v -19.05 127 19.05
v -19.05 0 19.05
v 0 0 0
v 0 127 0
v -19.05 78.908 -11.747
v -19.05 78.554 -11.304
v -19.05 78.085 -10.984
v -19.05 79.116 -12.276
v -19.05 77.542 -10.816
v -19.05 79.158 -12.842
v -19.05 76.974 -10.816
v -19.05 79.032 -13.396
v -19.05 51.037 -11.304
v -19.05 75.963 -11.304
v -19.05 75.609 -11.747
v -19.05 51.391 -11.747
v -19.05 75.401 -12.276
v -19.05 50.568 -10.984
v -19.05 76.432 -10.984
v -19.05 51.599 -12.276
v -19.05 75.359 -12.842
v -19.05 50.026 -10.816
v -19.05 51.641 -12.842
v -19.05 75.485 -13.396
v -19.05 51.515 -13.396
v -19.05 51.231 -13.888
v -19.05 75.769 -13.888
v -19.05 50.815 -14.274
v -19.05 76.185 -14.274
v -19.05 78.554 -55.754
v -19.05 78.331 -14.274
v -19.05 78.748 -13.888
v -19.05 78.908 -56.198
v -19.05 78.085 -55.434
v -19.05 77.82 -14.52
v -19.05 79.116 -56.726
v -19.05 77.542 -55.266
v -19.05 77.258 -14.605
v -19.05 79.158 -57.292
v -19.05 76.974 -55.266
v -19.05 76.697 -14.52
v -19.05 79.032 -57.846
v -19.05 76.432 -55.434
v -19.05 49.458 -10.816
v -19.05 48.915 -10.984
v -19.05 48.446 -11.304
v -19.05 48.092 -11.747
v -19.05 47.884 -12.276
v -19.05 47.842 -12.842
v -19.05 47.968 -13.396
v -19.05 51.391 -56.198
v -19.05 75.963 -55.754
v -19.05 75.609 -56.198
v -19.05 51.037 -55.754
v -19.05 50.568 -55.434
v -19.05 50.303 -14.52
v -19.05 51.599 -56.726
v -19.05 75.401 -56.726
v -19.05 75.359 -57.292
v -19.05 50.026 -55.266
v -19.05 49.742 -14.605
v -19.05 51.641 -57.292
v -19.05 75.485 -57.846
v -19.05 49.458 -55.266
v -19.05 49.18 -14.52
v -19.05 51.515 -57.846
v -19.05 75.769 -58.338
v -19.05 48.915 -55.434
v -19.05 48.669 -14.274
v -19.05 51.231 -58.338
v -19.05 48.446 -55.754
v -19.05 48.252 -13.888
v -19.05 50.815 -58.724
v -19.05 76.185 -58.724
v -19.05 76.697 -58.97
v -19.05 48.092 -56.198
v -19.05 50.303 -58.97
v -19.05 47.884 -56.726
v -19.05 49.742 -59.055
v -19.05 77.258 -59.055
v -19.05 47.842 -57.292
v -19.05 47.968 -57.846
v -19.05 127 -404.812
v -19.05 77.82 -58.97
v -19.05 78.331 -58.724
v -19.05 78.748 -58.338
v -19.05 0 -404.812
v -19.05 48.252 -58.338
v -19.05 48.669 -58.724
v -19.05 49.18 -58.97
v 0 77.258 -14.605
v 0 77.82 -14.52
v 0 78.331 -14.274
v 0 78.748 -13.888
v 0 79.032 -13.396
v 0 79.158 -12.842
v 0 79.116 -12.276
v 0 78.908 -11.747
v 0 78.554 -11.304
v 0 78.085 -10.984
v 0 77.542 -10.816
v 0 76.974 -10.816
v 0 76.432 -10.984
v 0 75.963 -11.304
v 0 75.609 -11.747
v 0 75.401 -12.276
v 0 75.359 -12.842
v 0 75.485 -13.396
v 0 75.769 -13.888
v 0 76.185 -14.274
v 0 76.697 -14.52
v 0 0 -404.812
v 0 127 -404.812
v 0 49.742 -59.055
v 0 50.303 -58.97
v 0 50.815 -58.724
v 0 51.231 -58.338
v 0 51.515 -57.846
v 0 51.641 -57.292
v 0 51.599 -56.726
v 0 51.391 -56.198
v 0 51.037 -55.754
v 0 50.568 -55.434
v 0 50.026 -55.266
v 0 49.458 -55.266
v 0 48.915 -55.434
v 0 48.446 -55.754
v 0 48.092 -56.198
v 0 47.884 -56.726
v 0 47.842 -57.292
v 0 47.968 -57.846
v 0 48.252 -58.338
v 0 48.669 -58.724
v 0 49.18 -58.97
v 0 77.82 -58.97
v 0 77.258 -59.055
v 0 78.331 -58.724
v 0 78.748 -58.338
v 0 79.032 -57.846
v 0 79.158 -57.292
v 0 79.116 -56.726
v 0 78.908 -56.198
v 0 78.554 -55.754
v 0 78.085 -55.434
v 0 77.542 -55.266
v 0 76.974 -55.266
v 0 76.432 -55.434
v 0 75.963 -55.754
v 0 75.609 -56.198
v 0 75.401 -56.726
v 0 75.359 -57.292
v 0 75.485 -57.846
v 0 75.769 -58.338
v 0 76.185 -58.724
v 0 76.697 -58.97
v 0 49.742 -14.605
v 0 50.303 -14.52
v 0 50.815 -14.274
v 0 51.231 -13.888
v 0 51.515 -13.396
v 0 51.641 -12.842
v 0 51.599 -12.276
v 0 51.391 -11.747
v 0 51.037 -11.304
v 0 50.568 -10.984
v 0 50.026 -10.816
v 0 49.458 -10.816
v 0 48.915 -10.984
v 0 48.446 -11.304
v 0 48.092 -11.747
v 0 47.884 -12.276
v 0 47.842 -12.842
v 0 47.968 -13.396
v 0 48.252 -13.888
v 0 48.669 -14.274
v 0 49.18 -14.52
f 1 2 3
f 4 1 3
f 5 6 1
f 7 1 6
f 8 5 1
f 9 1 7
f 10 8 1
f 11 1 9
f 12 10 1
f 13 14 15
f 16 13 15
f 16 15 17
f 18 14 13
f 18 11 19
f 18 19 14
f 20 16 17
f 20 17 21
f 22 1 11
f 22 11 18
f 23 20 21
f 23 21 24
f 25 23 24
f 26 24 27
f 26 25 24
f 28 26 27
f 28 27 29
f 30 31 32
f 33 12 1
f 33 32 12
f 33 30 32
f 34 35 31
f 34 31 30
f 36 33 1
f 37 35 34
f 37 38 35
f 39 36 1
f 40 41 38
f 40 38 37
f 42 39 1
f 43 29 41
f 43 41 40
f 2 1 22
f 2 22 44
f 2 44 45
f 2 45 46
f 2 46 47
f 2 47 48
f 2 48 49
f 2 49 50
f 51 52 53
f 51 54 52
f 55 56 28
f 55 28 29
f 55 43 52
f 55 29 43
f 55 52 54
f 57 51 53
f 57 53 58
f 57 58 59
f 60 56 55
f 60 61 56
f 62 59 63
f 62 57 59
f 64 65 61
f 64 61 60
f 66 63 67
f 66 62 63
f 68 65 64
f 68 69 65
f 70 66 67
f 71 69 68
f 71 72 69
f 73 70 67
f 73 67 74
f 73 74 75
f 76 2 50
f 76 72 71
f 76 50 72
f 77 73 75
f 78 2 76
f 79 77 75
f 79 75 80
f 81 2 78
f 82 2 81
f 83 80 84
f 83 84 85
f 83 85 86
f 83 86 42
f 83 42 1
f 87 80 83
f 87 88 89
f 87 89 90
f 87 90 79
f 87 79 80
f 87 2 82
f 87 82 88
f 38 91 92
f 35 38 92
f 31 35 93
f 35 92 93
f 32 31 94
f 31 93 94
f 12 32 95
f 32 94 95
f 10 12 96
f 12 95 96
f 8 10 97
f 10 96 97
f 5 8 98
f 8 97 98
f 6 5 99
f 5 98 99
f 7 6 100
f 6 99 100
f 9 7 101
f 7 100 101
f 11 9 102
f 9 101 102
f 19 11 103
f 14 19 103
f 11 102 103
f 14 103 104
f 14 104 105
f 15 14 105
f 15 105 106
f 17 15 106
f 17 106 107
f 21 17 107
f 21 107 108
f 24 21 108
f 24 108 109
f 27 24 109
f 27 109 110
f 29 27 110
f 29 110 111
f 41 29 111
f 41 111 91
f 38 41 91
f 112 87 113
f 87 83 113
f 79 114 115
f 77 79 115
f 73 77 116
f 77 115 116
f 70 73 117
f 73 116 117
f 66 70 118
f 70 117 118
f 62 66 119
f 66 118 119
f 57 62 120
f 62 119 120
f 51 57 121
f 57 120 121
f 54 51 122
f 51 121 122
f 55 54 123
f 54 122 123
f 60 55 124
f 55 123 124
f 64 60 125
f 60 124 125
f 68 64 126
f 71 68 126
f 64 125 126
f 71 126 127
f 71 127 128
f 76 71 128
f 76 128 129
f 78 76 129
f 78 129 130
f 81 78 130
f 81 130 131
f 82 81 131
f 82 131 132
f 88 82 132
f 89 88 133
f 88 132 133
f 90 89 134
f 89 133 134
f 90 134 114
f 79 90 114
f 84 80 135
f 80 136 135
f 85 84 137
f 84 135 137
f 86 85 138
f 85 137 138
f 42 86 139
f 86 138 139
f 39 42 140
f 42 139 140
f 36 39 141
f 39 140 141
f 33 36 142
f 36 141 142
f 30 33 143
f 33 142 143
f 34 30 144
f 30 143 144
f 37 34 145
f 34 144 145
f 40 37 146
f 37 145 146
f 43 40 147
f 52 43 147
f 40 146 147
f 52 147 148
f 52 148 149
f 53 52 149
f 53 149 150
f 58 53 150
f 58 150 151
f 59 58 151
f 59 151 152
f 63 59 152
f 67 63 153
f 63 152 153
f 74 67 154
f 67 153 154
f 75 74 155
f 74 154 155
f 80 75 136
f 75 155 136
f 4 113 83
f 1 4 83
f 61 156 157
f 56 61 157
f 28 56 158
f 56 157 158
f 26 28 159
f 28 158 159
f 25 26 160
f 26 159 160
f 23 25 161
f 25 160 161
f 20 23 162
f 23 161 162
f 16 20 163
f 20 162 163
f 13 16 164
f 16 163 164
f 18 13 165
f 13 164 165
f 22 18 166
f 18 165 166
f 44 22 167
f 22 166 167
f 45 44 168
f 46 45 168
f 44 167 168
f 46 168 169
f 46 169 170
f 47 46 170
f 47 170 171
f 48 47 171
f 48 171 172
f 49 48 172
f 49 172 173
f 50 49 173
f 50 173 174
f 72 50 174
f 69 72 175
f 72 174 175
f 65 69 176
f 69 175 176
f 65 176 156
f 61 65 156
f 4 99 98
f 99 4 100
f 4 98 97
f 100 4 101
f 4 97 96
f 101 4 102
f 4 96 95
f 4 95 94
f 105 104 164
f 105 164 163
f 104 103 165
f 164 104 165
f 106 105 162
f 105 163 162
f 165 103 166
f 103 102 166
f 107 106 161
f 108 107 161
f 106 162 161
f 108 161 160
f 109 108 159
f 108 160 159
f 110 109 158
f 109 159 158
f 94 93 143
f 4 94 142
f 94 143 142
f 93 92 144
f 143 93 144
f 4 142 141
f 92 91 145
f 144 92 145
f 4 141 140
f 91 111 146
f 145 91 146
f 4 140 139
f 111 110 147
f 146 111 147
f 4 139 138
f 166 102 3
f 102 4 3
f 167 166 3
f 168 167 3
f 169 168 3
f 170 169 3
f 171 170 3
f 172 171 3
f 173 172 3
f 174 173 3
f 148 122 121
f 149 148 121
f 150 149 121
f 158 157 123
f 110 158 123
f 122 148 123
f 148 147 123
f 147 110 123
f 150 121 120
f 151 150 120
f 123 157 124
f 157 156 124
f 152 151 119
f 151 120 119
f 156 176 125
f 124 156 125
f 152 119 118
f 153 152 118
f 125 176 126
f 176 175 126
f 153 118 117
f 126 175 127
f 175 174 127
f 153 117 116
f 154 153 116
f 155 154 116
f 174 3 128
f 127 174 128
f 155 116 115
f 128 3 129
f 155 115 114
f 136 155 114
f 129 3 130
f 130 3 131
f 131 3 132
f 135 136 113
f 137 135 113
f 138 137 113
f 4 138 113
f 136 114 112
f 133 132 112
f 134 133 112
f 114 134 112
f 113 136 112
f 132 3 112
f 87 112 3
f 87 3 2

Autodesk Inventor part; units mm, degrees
ref_plane "YZ Plane" through (0, 0, 0) normal (1, 0, 0) x (0, 1, 0)
ref_plane "XZ Plane" through (0, 0, 0) normal (0, 1, 0) x (-1, 0, 0)
ref_plane "XY Plane" through (0, 0, 0) normal (0, 0, 1) x (1, 0, 0)
sketch "Sketch2" plane through (0, 0, 0) normal (0, 1, 0) x (-1, 0, 0)
  line L0 (0, 0) -> (0, -812.8)
  line L1 (19.05, 19.05) -> (19.05, -831.85)
  line L2 (19.05, -831.85) -> (0, -812.8)
  line L3 (19.05, 19.05) -> (0, 0)
  point P0 (19.05, -406.4)
  point P1 (0, -406.4)
  dimension "d2" = 812.8
  dimension "d3" = 850.9
  dimension "d4" = 19.05
extrude "Extrusion1" add sketch "Sketch2" along normal blind 127
sketch "Sketch3" plane through (0, 0, 0) normal (1, 0, 0) x (0, 0, -1)
  line L0 (0, 0) -> (812.8, 0) construction
  line L1 (812.8, 0) -> (812.8, 127) construction
  line L2 (0, 127) -> (812.8, 127) construction
  line L3 (0, 0) -> (0, 127) construction
  line L4 (0, 77.2583) -> (12.7, 77.2583) construction
  circle A0 centre (12.7, 77.2583) radius 1.905
  circle A1 centre (57.15, 77.2583) radius 1.905
  circle A2 centre (101.6, 77.2583) radius 1.905 construction
  circle A3 centre (12.7, 49.7417) radius 1.905
  circle A4 centre (57.15, 49.7417) radius 1.905
  circle A5 centre (101.6, 49.7417) radius 1.905 construction
  line L5 (406.4, 127) -> (406.4, 0) construction
  circle A6 centre (800.1, 77.2583) radius 1.905
  circle A7 centre (755.65, 77.2583) radius 1.905
  circle A8 centre (711.2, 77.2583) radius 1.905 construction
  circle A9 centre (800.1, 49.7417) radius 1.905
  circle A10 centre (755.65, 49.7417) radius 1.905
  circle A11 centre (711.2, 49.7417) radius 1.905 construction
  line L6 (12.7, 77.2583) -> (12.7, 49.7417) construction
  line L7 (-19.05, 0) -> (-19.05, 127) projected
  point P0 (12.7, 63.5)
  dimension "d9" = 3.81
  dimension "d12" = 44.45
  dimension "d15" = 27.5167
  dimension "d23" = 63.5
  dimension "d24" = 31.75
extrude "Extrusion2" cut sketch "Sketch3" against normal blind 127
sketch "Sketch4" plane through (0, 127, 0) normal (0, 1, 0) x (1, 0, 0)
  line L0 (-19.05, 831.85) -> (-19.05, -19.05) projected
  line L1 (-19.05, 406.4) -> (0, 406.4)
  line L2 (0, 0) -> (0, 812.8) projected
  line L3 (0, 0) -> (0, 812.8) projected
  line L4 (0, 812.8) -> (-19.05, 831.85) projected
  line L5 (-19.05, 831.85) -> (-19.05, -19.05) projected
  line L6 (-19.05, -19.05) -> (0, 0) projected
  line L7 (-19.05, 404.8125) -> (0, 404.8125)
  point P0 (-19.05, 404.8125)
  point P1 (0, 404.8125)
  dimension "d22" = 1.5875
extrude "Extrusion3" cut sketch "Sketch4" against normal blind 127 contours L4 L2 L1 L0 | L1 L2 L7 L0
properties part number "BUMP_002_Wood2" material "Wood (Birch)"
